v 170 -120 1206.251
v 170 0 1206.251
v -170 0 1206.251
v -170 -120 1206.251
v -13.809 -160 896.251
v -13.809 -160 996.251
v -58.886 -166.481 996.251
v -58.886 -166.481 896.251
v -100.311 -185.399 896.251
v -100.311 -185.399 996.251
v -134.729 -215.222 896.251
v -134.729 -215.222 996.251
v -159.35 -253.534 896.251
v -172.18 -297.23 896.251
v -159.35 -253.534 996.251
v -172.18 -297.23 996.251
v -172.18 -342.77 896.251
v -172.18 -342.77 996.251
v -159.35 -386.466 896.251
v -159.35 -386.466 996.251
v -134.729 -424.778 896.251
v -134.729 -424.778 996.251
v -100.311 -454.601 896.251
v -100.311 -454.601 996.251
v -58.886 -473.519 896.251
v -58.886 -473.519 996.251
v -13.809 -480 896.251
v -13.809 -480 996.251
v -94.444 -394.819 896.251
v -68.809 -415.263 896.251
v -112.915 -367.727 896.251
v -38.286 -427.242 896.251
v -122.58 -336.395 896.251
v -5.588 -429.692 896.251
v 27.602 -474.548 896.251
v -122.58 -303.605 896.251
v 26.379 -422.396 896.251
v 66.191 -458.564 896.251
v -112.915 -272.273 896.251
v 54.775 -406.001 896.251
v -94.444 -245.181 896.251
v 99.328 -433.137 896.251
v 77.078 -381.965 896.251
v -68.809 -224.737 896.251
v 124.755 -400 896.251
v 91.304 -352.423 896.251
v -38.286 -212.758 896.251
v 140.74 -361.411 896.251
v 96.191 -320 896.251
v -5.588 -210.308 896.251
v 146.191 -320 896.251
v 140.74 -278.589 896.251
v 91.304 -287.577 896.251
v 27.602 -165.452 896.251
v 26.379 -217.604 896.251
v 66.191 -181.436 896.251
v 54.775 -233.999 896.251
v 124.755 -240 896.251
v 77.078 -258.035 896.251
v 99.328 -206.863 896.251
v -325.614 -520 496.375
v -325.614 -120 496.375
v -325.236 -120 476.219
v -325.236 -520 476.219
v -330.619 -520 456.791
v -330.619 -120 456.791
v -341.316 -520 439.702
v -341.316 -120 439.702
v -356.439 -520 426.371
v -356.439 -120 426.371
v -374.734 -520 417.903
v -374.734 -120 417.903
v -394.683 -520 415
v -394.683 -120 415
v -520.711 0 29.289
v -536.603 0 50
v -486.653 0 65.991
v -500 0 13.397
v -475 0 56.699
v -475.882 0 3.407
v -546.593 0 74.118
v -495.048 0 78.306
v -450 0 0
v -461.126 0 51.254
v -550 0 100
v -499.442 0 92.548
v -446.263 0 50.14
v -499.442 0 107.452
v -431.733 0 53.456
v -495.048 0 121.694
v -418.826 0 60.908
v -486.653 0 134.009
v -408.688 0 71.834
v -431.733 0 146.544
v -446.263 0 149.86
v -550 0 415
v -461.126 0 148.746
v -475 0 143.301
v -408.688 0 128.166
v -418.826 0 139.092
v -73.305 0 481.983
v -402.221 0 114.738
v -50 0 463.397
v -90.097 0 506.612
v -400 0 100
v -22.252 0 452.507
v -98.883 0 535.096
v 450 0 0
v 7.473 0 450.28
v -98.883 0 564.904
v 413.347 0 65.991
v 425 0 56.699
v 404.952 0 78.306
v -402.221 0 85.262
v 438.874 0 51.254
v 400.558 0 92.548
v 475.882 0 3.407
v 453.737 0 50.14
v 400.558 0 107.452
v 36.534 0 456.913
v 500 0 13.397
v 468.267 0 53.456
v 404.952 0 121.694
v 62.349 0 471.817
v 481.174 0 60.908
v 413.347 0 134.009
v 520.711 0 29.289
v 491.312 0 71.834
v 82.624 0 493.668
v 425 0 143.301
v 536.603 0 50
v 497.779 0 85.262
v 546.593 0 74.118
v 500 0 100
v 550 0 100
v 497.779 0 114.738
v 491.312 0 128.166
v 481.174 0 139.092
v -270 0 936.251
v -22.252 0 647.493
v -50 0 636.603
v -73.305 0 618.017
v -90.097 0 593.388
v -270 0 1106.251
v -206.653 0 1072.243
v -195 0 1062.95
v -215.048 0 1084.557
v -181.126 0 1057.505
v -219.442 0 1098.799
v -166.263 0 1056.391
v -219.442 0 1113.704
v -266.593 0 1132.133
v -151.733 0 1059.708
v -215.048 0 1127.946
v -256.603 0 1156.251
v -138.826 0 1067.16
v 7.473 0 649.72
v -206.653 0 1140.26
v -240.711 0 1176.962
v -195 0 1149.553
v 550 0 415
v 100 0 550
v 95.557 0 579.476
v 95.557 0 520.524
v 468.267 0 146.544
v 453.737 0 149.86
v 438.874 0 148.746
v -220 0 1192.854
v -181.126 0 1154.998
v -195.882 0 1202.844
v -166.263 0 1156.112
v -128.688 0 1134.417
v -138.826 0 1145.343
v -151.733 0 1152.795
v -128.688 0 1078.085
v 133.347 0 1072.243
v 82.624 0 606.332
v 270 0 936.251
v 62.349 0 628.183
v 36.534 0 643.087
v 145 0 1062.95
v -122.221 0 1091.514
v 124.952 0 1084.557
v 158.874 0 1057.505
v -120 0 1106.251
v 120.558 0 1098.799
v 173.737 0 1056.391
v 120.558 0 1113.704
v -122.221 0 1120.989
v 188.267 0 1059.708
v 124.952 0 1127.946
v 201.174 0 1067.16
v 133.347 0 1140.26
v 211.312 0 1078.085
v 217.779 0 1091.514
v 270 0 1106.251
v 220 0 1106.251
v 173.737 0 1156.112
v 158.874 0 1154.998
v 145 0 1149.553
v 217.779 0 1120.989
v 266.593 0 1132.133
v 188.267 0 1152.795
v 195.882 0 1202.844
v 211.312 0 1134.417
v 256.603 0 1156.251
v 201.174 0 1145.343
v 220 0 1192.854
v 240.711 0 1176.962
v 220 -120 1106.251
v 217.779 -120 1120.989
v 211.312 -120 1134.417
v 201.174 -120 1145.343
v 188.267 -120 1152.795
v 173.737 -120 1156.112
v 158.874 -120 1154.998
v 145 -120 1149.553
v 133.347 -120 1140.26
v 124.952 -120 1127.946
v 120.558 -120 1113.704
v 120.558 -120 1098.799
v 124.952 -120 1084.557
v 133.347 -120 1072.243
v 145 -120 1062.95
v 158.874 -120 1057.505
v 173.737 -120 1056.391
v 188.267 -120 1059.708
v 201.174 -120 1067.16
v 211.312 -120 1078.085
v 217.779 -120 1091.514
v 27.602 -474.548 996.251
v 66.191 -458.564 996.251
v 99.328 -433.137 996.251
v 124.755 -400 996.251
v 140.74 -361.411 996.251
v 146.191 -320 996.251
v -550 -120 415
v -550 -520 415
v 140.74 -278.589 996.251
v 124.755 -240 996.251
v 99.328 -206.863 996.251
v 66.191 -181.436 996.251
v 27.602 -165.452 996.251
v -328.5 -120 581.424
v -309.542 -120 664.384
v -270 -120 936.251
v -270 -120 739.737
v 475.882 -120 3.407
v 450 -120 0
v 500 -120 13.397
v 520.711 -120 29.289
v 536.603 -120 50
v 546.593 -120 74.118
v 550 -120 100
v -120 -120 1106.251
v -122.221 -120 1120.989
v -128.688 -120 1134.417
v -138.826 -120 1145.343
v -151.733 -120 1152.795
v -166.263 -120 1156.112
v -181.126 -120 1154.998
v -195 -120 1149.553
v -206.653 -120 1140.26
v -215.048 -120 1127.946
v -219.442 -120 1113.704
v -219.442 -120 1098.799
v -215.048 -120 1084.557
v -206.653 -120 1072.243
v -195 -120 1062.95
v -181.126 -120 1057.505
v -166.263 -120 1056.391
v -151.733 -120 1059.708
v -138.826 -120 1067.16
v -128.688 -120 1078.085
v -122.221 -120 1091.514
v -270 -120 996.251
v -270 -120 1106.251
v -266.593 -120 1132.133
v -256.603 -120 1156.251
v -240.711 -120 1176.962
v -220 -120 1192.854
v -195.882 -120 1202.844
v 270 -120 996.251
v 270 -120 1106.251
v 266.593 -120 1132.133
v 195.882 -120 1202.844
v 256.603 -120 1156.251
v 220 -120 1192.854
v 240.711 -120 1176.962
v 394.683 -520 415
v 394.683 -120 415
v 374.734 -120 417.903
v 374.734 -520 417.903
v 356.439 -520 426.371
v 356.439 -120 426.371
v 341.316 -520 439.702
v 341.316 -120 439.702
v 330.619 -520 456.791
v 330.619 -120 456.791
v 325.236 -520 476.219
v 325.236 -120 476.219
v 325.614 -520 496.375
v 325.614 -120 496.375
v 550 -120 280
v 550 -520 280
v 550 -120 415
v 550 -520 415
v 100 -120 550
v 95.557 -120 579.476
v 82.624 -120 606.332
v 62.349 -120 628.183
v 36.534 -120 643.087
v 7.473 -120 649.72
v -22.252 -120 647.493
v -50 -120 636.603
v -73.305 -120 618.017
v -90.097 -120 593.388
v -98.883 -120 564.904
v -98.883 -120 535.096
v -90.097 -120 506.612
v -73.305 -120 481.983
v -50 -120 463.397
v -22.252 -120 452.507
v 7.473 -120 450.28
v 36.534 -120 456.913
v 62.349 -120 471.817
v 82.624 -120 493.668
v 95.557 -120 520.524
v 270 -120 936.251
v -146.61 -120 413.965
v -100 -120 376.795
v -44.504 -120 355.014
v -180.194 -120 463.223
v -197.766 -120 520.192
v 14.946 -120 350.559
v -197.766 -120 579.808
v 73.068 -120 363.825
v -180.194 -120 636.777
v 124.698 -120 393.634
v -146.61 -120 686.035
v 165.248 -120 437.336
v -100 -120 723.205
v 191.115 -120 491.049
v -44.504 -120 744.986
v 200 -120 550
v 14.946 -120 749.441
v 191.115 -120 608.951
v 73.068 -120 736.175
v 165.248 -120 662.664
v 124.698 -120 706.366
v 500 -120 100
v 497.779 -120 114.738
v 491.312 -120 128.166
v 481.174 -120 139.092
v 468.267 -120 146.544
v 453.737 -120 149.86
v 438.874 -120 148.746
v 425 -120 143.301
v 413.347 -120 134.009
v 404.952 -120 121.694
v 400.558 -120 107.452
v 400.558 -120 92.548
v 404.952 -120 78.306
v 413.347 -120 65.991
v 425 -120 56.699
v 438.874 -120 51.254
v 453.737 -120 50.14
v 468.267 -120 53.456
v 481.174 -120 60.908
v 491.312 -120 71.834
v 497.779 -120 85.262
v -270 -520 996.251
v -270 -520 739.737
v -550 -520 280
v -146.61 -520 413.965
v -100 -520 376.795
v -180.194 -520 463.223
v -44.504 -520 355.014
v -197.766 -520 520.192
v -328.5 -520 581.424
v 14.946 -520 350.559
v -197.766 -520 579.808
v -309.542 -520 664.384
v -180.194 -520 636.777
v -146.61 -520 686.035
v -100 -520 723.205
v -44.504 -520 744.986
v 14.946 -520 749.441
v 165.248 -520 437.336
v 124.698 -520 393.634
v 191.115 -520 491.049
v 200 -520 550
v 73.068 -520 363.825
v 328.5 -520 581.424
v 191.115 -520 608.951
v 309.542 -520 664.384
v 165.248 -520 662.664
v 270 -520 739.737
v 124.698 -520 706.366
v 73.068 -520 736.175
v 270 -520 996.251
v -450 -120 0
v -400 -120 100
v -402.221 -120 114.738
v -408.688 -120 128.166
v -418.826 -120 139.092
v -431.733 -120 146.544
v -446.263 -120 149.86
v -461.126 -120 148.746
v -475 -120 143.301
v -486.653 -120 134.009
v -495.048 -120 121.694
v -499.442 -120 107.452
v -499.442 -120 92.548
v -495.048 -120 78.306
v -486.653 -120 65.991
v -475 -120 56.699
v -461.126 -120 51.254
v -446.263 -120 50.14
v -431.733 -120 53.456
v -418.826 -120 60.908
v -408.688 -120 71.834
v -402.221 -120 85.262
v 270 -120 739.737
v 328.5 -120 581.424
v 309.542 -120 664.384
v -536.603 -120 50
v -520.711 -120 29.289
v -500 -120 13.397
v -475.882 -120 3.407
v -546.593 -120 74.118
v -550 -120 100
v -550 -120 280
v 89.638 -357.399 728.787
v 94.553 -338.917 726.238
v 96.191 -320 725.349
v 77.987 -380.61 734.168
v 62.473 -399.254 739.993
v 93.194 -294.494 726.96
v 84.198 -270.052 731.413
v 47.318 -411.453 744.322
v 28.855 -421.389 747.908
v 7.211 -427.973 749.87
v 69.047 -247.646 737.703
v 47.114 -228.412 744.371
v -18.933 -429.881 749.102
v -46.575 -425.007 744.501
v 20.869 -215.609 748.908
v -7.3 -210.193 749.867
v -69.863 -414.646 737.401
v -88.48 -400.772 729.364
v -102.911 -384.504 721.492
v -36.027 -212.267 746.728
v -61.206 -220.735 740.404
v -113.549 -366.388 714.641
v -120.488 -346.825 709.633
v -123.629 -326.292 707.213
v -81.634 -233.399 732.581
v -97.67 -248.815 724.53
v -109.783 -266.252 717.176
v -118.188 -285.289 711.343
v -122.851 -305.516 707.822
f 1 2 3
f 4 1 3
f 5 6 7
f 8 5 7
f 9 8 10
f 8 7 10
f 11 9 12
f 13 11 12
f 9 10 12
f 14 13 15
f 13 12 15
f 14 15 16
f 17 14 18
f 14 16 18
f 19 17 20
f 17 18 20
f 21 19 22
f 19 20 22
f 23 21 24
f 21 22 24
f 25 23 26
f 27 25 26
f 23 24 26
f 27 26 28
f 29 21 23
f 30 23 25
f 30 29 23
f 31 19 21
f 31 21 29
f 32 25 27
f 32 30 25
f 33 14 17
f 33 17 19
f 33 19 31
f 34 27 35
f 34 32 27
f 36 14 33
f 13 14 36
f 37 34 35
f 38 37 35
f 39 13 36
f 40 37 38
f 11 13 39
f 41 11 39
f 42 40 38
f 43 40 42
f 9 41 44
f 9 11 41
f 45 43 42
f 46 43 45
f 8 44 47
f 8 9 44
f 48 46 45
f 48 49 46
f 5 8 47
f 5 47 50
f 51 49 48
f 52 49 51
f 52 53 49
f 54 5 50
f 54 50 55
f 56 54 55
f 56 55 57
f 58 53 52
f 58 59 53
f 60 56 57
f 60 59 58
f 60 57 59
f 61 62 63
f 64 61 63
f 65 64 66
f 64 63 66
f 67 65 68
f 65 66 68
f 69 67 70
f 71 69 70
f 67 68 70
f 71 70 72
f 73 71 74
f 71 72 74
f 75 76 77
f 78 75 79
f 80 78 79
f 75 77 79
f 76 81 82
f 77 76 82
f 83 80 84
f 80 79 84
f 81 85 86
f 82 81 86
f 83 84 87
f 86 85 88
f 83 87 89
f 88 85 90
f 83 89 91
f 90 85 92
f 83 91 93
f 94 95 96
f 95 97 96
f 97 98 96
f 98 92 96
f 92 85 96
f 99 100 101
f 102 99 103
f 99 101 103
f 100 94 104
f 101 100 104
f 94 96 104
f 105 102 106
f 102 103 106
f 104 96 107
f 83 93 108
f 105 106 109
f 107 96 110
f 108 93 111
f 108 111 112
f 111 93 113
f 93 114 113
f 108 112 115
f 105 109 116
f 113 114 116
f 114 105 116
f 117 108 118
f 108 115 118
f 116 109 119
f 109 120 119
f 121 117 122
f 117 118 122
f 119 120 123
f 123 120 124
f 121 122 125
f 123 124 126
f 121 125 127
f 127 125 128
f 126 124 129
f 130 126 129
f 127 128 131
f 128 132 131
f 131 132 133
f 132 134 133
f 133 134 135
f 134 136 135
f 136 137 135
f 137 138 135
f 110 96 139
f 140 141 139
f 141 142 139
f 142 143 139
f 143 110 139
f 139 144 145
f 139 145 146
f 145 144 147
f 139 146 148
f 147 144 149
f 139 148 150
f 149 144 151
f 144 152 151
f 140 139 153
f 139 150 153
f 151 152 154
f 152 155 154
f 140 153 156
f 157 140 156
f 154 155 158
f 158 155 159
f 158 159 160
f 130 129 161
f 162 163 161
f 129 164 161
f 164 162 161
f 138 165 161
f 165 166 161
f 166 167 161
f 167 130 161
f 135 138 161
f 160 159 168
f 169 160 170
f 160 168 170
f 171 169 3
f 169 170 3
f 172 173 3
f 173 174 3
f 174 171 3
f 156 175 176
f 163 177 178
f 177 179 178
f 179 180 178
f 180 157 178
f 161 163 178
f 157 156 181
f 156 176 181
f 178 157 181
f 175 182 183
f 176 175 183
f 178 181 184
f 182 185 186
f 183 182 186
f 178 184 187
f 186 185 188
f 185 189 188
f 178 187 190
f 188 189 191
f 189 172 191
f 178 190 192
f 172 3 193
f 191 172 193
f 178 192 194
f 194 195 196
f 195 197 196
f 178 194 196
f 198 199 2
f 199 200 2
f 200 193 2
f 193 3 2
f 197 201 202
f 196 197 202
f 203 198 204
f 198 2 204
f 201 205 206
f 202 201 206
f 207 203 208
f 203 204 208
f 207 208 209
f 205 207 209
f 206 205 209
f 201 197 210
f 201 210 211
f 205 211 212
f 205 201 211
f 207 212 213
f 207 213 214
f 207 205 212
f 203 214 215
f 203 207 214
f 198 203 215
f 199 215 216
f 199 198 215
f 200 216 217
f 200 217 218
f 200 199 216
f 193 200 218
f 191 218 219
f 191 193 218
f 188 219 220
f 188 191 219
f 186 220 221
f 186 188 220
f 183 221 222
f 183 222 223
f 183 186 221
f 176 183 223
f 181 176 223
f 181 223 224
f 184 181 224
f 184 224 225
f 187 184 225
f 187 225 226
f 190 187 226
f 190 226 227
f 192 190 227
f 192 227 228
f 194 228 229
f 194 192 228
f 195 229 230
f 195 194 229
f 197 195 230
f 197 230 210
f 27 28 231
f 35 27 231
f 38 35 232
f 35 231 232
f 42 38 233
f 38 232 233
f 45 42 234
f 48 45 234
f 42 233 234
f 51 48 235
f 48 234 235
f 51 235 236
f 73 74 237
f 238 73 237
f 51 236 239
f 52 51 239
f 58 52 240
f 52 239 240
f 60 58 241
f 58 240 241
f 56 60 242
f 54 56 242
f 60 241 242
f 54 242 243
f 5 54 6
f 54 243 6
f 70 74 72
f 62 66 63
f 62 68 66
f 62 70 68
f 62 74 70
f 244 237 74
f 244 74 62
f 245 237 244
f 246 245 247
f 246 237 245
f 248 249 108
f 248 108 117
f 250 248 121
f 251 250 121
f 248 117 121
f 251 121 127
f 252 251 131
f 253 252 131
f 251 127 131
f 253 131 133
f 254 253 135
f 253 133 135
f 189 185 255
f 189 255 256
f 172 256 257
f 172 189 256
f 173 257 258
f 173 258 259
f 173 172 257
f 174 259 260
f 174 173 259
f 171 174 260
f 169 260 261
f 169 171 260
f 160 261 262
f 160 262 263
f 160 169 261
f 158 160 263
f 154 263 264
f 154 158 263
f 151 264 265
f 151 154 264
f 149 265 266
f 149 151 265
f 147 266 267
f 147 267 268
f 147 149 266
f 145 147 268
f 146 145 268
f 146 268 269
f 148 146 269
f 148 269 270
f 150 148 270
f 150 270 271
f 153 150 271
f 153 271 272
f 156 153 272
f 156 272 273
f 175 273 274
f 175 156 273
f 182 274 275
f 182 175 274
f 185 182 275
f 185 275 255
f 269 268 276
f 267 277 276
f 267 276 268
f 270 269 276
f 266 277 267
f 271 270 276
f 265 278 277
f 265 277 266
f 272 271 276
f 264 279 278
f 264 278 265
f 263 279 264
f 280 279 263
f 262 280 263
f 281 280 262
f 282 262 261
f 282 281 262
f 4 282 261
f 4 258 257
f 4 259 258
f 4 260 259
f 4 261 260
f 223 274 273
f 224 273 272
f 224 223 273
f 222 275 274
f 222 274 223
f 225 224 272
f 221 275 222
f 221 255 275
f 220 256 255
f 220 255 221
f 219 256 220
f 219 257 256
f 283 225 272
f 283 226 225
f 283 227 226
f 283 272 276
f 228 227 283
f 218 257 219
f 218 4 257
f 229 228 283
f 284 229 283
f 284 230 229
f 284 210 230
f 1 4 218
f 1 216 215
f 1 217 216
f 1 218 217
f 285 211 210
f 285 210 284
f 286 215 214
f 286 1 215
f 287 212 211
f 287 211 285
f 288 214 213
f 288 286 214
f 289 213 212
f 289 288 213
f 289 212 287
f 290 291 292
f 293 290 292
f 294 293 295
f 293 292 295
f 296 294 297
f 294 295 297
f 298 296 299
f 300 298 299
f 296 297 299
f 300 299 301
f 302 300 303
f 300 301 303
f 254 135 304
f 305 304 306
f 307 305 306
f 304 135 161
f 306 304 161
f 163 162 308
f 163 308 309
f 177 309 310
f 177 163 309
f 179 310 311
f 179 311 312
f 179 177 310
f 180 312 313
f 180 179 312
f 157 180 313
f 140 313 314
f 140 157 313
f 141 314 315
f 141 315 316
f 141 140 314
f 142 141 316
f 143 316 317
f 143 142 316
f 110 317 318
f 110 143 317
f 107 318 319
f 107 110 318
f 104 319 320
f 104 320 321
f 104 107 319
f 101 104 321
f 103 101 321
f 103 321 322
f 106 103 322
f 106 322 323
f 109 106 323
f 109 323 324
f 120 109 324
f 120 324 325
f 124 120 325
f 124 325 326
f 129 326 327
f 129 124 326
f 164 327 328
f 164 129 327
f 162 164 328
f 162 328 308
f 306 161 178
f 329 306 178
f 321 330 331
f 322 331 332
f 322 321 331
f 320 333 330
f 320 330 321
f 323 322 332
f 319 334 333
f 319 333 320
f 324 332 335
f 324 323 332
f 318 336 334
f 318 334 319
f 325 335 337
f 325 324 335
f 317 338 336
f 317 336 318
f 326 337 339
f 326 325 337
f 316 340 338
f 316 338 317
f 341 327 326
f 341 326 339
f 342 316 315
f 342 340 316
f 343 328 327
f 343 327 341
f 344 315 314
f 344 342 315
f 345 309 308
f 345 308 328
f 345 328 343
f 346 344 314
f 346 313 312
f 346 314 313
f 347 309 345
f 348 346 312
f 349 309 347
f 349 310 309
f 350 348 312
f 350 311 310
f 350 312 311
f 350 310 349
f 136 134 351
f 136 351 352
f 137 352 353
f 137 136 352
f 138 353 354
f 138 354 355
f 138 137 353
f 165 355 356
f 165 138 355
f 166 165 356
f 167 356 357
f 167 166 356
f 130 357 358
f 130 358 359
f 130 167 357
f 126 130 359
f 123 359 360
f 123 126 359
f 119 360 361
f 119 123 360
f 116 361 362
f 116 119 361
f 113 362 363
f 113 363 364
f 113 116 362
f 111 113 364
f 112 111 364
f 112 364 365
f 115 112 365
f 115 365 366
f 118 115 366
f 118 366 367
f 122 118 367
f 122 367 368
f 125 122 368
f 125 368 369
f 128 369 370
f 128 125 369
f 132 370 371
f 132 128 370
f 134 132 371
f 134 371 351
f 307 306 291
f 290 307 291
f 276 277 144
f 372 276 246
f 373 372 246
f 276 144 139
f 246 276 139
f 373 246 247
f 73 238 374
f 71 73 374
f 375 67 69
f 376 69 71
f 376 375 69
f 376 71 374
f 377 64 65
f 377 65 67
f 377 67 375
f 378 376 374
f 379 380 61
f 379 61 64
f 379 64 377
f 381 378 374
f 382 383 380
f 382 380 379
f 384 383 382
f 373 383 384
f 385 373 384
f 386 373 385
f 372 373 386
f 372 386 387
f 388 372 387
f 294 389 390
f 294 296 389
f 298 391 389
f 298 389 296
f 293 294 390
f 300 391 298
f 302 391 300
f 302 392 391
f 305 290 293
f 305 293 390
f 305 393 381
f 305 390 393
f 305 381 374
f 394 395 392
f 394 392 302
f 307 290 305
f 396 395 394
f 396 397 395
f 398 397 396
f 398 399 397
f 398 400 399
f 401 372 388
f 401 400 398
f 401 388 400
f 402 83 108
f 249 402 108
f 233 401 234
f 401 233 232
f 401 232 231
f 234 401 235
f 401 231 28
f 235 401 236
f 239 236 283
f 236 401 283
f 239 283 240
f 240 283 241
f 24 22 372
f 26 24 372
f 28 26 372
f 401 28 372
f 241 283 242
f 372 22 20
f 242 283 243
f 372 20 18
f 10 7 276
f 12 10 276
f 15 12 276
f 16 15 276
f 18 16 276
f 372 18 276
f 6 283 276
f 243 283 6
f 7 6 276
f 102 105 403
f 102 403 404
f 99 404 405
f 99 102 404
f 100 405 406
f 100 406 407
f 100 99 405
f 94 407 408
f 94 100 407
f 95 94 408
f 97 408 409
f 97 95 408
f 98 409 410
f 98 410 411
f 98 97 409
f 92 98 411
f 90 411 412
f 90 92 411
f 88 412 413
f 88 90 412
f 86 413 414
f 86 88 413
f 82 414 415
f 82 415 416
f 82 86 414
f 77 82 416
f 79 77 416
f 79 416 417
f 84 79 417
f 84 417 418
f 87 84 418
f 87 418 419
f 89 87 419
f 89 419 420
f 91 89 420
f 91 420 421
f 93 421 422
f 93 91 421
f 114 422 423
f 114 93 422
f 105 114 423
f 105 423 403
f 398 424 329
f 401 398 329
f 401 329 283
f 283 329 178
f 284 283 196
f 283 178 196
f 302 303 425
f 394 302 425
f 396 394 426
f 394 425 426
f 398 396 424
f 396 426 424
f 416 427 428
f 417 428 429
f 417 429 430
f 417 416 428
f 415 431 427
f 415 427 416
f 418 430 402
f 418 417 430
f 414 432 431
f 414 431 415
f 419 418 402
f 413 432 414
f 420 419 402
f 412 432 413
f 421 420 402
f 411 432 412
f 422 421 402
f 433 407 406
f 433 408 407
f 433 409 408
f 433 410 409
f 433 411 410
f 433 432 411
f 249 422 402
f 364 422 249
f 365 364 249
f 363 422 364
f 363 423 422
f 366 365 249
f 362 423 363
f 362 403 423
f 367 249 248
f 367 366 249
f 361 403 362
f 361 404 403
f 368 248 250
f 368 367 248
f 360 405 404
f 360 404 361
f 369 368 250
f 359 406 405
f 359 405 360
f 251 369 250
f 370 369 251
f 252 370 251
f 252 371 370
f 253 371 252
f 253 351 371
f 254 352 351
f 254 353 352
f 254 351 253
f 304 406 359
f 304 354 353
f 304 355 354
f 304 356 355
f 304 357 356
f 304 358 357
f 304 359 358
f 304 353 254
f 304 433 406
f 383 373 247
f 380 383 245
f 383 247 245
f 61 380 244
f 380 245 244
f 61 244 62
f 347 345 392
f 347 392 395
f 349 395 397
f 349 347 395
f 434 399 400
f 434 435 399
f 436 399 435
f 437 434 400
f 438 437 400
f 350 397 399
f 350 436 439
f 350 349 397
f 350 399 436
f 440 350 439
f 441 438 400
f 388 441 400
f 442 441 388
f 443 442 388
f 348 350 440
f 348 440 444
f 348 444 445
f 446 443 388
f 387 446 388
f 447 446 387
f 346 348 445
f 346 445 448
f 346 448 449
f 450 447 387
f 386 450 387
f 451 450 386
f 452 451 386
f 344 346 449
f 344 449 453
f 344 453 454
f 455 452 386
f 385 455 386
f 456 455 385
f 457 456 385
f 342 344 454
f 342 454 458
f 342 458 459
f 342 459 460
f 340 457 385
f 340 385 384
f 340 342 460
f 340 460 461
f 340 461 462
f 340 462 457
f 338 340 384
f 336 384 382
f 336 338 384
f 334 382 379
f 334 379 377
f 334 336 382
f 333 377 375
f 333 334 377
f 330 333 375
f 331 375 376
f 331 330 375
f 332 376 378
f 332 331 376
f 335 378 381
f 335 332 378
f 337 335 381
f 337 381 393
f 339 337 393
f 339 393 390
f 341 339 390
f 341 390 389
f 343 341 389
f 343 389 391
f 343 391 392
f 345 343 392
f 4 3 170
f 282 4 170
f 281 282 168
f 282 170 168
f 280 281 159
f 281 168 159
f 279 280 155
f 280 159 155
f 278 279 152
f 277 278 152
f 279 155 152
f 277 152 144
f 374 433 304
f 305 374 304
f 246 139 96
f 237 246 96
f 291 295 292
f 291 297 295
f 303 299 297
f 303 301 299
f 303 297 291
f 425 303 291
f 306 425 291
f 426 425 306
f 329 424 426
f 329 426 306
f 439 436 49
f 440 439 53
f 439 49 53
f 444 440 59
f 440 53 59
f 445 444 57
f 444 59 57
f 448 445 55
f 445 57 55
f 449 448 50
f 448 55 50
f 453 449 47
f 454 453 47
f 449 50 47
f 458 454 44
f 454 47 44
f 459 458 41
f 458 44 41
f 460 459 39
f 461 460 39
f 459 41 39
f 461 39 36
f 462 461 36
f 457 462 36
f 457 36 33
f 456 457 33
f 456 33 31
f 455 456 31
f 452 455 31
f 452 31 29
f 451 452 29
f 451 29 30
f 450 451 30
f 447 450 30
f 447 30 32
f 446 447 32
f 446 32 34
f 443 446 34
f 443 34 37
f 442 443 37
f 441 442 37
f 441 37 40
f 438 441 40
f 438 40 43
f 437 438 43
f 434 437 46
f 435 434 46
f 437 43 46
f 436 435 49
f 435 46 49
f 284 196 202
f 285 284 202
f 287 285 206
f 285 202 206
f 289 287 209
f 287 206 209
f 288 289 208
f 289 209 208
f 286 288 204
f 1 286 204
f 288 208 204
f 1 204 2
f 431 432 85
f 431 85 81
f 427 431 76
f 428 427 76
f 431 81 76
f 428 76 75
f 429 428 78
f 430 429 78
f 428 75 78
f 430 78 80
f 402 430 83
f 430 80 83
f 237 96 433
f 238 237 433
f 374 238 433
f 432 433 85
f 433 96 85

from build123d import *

# Parameters (mm, degrees)
F0_R     = 200
F1_DEPTH = 520
F0_R_2   = 50
F0_W     = 120
F0_H     = 280
F2_DEPTH = 120
F0_R_3   = 100
F3_DEPTH = 120
F5_DEPTH = 100
F6_R     = 110
F7_DEPTH = 289.1810463391


with BuildPart() as f1:
    # F0 (on Front) → F1 (new body)
    with BuildSketch(Plane.XZ):
        with BuildLine():
            Line((-60, 280), (60, 280))
            Line((60, 280), (550, 280))
            Line((550, 280), (550, 415))
            Line((550, 415), (394.6834174373, 415))
            ThreePointArc((394.6834174373, 415), (341.3155900504, 439.7023731306), (325.6138193858, 496.375))
            ThreePointArc((325.6138193858, 496.375), (321.7066673274, 623.5174822551), (270, 739.7366596101))
            Line((270, 739.7366596101), (270, 936.2514615059))
            Line((270, 936.2514615059), (270, 996.2514615059))
            Line((270, 996.2514615059), (-270, 996.2514615059))
            Line((-270, 996.2514615059), (-270, 936.2514615059))
            Line((-270, 936.2514615059), (-270, 739.7366596101))
            ThreePointArc((-270, 739.7366596101), (-321.7066673274, 623.5174822551), (-325.6138193858, 496.375))
            ThreePointArc((-325.6138193858, 496.375), (-341.3155900504, 439.7023731306), (-394.6834174373, 415))
            Line((-394.6834174373, 415), (-550, 415))
            Line((-550, 415), (-550, 280))
            Line((-550, 280), (-60, 280))
        make_face()
        with Locations((0, 550)):
            Circle(F0_R, mode=Mode.SUBTRACT)
    extrude(amount=F1_DEPTH)

    # F0 (on Front) → F2 (join)
    with BuildSketch(Plane.XZ):
        with BuildLine():
            Line((60, 0), (450, 0))
            ThreePointArc((450, 0), (520.7106781187, 29.2893218813), (550, 100))
            Line((550, 100), (550, 280))
            Line((550, 280), (60, 280))
            Line((60, 280), (60, 0))
        make_face()
        with Locations((450, 100)):
            Circle(F0_R_2, mode=Mode.SUBTRACT)
        with Locations((0, 140)):
            Rectangle(F0_W, F0_H)
        with BuildLine():
            Line((-60, 280), (60, 280))
            Line((60, 280), (550, 280))
            Line((550, 280), (550, 415))
            Line((550, 415), (394.6834174373, 415))
            ThreePointArc((394.6834174373, 415), (341.3155900504, 439.7023731306), (325.6138193858, 496.375))
            ThreePointArc((325.6138193858, 496.375), (321.7066673274, 623.5174822551), (270, 739.7366596101))
            Line((270, 739.7366596101), (270, 936.2514615059))
            Line((270, 936.2514615059), (270, 996.2514615059))
            Line((270, 996.2514615059), (-270, 996.2514615059))
            Line((-270, 996.2514615059), (-270, 936.2514615059))
            Line((-270, 936.2514615059), (-270, 739.7366596101))
            ThreePointArc((-270, 739.7366596101), (-321.7066673274, 623.5174822551), (-325.6138193858, 496.375))
            ThreePointArc((-325.6138193858, 496.375), (-341.3155900504, 439.7023731306), (-394.6834174373, 415))
            Line((-394.6834174373, 415), (-550, 415))
            Line((-550, 415), (-550, 280))
            Line((-550, 280), (-60, 280))
        make_face()
        with Locations((0, 550)):
            Circle(F0_R, mode=Mode.SUBTRACT)
        with BuildLine():
            Line((-450, 0), (-60, 0))
            Line((-60, 0), (-60, 280))
            Line((-60, 280), (-550, 280))
            Line((-550, 280), (-550, 100))
            ThreePointArc((-550, 100), (-520.7106781187, 29.2893218813), (-450, 0))
        make_face()
        with Locations((-450, 100)):
            Circle(F0_R_2, mode=Mode.SUBTRACT)
        with BuildLine():
            Line((394.6834174373, 415), (550, 415))
            Line((550, 415), (270, 936.2514615059))
            Line((270, 936.2514615059), (270, 739.7366596101))
            ThreePointArc((270, 739.7366596101), (321.7066673274, 623.5174822551), (325.6138193858, 496.375))
            ThreePointArc((325.6138193858, 496.375), (341.3155900504, 439.7023731306), (394.6834174373, 415))
        make_face()
        with BuildLine():
            Line((-270, 936.2514615059), (-550, 415))
            Line((-550, 415), (-394.6834174373, 415))
            ThreePointArc((-394.6834174373, 415), (-341.3155900504, 439.7023731306), (-325.6138193858, 496.375))
            ThreePointArc((-325.6138193858, 496.375), (-321.7066673274, 623.5174822551), (-270, 739.7366596101))
            Line((-270, 739.7366596101), (-270, 936.2514615059))
        make_face()
        with BuildLine():
            Line((-270, 996.2514615059), (270, 996.2514615059))
            Line((270, 996.2514615059), (270, 1106.2514615059))
            ThreePointArc((270, 1106.2514615059), (240.7106781187, 1176.9621396245), (170, 1206.2514615059))
            Line((170, 1206.2514615059), (-170, 1206.2514615059))
            ThreePointArc((-170, 1206.2514615059), (-240.7106781187, 1176.9621396245), (-270, 1106.2514615059))
            Line((-270, 1106.2514615059), (-270, 996.2514615059))
        make_face()
        with Locations((-170, 1106.2514615059)):
            Circle(F0_R_2, mode=Mode.SUBTRACT)
        with Locations((170, 1106.2514615059)):
            Circle(F0_R_2, mode=Mode.SUBTRACT)
    extrude(amount=F2_DEPTH)

    # F0 (on Front) → F3 (join)
    with BuildSketch(Plane.XZ):
        with Locations((0, 550)):
            Circle(F0_R)
        with Locations((0, 550)):
            Circle(F0_R_3, mode=Mode.SUBTRACT)
    extrude(amount=F3_DEPTH)

    # F4 (on face) → F5 (cut)
    with BuildSketch(Plane.XY.offset(996.2514615059)):
        with BuildLine():
            ThreePointArc((146.1913956702, -320), (99.32848066, -206.8629150102), (-13.8086043298, -160))
            Line((-13.8086043298, -160), (-13.8086043298, -210))
            ThreePointArc((-13.8086043298, -210), (63.9731416007, -242.2182540695), (96.1913956702, -320))
            ThreePointArc((96.1913956702, -320), (63.9731416007, -397.7817459305), (-13.8086043298, -430))
            Line((-13.8086043298, -430), (-13.8086043298, -480))
            ThreePointArc((-13.8086043298, -480), (99.32848066, -433.1370849898), (146.1913956702, -320))
        make_face()
        with BuildLine():
            Line((-13.8086043298, -210), (-13.8086043298, -160))
            ThreePointArc((-13.8086043298, -160), (-173.8086043298, -320), (-13.8086043298, -480))
            Line((-13.8086043298, -480), (-13.8086043298, -430))
            ThreePointArc((-13.8086043298, -430), (-123.8086043298, -320), (-13.8086043298, -210))
        make_face()
    extrude(amount=-F5_DEPTH, mode=Mode.SUBTRACT)

    # F6 (on face) → F7 (cut, through all)
    with BuildSketch(Plane.XY.offset(996.2514615059)):
        with Locations((-13.8086043298, -320)):
            Circle(F6_R)
    extrude(amount=-F7_DEPTH, mode=Mode.SUBTRACT)


solid = f1.part
